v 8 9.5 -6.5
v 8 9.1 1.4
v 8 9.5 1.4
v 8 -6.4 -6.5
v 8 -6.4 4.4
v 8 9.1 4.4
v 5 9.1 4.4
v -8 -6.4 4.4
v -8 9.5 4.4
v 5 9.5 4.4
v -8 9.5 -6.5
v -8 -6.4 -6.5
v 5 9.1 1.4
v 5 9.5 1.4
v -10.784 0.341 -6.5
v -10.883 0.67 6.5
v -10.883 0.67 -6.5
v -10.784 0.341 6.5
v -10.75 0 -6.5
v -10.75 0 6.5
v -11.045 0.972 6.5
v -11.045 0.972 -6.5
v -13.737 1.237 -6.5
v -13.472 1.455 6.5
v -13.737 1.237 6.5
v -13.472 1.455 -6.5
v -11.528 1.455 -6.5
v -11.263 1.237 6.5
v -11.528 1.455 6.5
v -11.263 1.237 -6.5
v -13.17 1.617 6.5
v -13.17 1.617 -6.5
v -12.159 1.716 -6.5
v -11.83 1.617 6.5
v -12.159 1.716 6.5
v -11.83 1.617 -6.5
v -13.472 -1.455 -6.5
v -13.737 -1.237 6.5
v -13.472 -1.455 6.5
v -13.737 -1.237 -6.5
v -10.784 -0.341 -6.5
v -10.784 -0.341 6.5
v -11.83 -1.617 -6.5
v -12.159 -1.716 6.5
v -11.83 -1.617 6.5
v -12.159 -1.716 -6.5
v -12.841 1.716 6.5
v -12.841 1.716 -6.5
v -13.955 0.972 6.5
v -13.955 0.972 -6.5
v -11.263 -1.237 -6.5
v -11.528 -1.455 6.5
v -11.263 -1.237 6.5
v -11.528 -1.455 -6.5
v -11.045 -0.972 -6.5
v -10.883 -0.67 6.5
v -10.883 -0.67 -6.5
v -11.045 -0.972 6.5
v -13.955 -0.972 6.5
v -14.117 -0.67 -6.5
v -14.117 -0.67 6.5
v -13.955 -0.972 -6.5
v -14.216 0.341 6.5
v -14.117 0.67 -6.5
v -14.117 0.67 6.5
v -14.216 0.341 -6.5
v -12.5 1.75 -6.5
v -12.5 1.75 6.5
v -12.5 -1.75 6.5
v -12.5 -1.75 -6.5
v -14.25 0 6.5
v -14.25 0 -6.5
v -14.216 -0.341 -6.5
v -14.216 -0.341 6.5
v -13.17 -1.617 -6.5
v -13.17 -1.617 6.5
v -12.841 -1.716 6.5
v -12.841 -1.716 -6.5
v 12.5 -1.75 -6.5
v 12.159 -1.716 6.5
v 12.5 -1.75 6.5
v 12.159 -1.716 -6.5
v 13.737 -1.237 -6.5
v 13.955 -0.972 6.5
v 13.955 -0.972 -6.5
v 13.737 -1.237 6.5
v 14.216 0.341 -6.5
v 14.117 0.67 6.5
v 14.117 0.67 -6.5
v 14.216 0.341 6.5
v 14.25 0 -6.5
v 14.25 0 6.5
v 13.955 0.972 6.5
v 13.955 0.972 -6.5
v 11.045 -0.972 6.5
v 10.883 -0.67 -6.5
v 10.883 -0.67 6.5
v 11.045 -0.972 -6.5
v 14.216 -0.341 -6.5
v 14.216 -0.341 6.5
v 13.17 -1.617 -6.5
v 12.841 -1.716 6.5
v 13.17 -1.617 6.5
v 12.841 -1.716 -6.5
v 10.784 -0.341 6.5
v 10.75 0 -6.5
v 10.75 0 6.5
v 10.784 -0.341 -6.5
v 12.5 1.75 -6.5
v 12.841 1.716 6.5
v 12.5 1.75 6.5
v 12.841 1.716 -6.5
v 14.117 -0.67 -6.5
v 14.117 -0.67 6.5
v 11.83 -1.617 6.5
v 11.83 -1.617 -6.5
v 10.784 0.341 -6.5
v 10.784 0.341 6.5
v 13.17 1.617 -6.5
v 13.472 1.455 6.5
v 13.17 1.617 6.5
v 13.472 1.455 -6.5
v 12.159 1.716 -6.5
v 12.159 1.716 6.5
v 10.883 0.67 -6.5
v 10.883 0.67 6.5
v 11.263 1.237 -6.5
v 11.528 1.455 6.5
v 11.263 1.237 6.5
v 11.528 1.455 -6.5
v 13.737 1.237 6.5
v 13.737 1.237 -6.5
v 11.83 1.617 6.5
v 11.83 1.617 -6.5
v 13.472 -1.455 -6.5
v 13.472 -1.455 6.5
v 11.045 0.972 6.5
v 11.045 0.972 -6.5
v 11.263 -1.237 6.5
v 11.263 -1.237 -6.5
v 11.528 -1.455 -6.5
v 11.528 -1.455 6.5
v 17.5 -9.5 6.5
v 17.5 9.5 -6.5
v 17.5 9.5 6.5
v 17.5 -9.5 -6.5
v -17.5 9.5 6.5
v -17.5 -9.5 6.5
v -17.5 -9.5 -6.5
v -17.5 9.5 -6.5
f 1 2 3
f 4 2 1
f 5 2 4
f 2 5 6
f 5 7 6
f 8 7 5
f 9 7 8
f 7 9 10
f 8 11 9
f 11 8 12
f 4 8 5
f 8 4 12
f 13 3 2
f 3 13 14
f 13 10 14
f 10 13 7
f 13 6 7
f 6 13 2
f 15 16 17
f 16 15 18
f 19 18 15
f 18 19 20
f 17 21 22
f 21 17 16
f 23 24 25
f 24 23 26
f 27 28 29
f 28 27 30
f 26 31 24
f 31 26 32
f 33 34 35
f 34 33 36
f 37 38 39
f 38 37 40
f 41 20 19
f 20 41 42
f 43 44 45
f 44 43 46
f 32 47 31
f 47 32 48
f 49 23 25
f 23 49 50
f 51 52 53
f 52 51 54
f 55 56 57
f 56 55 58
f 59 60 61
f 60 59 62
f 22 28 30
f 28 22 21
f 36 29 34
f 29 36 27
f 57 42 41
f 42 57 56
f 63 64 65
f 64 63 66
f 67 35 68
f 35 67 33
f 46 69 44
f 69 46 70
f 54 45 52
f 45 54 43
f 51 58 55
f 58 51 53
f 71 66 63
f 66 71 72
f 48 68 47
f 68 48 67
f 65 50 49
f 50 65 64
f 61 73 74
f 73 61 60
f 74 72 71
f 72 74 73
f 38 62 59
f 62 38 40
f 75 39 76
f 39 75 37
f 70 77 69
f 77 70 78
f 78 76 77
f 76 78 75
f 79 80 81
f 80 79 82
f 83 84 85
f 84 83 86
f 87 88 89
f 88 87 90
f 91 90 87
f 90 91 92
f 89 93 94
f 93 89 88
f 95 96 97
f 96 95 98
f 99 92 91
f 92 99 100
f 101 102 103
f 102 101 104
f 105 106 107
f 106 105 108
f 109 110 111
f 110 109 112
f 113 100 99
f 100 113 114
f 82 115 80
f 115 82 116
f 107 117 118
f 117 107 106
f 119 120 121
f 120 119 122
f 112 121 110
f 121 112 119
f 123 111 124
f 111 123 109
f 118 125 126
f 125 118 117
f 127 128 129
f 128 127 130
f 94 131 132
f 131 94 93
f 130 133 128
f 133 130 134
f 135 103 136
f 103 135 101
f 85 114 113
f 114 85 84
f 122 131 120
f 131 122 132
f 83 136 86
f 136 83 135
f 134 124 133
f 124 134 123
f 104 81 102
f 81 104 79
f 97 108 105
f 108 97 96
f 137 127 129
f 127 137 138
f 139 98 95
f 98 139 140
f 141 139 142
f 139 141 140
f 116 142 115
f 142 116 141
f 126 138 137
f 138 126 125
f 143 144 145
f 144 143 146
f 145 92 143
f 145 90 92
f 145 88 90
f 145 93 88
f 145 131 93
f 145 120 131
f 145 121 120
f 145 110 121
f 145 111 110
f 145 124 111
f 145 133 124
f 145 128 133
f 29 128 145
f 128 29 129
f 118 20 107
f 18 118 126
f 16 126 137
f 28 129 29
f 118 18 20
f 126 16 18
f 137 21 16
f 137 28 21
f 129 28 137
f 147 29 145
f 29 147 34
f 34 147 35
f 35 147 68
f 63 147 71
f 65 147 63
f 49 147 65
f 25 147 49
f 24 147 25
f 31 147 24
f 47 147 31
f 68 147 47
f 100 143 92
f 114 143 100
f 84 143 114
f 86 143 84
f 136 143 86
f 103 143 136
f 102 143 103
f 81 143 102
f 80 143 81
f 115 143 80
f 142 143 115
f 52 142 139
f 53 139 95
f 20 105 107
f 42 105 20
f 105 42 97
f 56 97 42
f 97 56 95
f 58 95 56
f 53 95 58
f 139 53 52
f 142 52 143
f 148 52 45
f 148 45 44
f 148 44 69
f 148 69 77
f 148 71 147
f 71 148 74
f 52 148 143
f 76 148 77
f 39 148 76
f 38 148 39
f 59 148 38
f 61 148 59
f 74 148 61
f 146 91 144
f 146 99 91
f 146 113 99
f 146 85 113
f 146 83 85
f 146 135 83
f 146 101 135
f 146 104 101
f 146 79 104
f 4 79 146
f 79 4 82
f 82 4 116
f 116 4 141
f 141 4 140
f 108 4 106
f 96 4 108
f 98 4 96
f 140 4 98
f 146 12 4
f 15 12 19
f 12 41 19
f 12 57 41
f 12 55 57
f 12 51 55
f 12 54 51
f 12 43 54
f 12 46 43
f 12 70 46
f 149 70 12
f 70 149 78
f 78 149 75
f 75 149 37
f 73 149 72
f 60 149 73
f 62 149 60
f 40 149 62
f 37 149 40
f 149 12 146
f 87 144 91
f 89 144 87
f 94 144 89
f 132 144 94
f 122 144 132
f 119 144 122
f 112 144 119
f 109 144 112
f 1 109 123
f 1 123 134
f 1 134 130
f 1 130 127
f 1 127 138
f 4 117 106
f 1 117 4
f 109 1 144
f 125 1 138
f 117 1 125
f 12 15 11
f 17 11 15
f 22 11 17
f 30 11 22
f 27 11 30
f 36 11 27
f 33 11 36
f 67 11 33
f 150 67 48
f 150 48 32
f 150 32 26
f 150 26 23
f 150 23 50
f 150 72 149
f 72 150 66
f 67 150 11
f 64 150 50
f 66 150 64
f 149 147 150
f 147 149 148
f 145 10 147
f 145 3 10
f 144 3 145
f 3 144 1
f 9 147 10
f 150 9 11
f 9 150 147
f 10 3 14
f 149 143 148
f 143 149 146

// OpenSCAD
module PowerJack()
{
  difference()
  {
    /* Body */
    cube([35, 19, 13], center=true);

    /* Barrel jack cutout */
    translate([0, 1.6, -1.1])
    {
      difference()
      {
        cube([16, 16, 11], center=true);

        translate([8, 8, 5.5])
        {
          cube([6, 1, 6], center=true);
        }
      }
    }

    /* Mounting holes */
    for (x = [-12.5, 12.5])
    {
      translate([x, 0, 0])
      {
        cylinder(d=3.5, h=100, center=true, $fn=32);
      }
    }
  }
}

PowerJack();
